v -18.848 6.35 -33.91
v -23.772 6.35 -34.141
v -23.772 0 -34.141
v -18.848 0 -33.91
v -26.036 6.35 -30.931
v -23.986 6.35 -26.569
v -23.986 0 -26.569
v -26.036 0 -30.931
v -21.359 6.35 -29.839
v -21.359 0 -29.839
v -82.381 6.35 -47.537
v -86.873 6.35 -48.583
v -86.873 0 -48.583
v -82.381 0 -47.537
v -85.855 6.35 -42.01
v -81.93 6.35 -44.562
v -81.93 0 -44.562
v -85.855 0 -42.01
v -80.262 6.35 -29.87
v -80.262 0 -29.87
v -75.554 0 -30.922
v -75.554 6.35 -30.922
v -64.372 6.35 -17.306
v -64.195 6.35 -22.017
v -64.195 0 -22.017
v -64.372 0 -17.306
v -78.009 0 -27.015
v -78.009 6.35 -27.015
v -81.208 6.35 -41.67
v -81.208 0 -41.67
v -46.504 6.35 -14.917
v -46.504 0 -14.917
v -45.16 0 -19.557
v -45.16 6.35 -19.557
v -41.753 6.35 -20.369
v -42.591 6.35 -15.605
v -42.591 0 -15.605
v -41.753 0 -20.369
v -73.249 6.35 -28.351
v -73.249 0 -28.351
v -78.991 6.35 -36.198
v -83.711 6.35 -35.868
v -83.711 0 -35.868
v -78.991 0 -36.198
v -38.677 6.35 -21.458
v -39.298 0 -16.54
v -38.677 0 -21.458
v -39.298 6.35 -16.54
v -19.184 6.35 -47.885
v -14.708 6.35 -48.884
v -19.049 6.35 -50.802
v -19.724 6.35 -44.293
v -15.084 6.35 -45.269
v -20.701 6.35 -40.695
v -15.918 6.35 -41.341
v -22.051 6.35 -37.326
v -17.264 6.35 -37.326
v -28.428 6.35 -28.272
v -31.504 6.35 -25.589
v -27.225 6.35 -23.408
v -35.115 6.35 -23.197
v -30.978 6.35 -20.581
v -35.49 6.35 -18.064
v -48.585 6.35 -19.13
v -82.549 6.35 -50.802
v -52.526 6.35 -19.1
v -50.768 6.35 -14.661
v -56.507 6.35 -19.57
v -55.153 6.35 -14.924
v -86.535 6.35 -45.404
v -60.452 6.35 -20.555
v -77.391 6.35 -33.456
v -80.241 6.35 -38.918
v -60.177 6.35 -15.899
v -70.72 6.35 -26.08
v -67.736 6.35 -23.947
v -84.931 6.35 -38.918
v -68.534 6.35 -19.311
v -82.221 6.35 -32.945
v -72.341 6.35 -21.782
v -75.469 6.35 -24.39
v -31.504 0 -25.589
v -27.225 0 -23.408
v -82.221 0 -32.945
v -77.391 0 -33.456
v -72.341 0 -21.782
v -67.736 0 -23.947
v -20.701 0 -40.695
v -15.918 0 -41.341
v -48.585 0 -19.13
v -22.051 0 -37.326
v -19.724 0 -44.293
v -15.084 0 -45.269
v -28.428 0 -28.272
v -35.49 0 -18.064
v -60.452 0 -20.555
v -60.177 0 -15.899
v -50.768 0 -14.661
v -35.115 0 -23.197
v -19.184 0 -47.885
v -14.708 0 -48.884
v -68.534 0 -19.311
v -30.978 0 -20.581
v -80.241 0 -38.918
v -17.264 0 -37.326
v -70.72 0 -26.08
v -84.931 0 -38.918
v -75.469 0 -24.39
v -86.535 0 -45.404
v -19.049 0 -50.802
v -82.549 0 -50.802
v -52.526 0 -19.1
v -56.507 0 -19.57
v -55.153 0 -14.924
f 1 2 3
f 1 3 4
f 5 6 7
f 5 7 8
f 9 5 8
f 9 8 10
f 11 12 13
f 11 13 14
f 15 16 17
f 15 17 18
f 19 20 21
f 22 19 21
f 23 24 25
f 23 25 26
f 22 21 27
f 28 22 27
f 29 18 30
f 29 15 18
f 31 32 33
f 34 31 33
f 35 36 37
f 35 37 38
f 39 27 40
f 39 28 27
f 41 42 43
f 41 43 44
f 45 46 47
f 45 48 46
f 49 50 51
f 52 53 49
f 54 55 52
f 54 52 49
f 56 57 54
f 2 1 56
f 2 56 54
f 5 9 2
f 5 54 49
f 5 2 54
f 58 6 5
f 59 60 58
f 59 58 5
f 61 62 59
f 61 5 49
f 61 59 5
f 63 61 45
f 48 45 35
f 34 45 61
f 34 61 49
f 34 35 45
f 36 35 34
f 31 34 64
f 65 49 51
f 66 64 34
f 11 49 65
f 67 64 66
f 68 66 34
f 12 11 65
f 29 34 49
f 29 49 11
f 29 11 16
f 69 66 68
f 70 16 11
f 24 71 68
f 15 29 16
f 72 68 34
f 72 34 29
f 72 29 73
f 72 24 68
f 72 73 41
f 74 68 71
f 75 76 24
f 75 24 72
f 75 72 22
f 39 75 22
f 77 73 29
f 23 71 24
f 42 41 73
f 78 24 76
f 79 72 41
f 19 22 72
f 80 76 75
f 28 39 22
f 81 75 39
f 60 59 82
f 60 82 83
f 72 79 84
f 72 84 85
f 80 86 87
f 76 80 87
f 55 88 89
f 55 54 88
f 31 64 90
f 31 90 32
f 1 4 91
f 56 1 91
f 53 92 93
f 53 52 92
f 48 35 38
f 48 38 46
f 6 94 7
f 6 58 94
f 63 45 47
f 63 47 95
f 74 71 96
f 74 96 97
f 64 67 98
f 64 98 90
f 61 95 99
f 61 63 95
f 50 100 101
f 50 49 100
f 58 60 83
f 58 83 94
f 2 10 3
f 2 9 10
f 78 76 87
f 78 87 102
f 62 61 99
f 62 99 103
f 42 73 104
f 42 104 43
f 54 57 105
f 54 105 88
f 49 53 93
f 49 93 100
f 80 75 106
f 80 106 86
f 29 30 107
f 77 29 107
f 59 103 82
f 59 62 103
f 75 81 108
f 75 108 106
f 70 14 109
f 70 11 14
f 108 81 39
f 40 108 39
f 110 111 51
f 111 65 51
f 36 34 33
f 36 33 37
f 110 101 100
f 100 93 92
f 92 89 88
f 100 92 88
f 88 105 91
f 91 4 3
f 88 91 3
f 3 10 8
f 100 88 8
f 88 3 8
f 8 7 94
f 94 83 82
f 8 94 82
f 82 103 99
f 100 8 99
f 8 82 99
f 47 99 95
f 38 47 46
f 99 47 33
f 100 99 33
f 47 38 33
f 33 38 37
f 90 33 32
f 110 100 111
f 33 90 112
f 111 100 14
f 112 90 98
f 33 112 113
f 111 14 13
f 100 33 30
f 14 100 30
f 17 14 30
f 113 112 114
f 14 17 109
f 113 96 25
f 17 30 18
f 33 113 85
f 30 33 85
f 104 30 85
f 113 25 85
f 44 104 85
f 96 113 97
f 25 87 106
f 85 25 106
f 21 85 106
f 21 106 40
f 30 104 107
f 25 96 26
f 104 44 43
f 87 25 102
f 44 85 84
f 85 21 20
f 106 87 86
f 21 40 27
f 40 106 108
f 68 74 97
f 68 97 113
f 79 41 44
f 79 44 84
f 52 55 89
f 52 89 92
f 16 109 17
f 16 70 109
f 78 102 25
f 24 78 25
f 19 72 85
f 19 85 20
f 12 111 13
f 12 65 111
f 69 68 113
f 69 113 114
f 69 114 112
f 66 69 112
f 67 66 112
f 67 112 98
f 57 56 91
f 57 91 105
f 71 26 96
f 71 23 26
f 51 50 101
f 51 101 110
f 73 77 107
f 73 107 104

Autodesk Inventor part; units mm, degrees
ref_plane "YZ Plane" through (0, 0, 0) normal (1, 0, 0) x (0, 1, 0)
ref_plane "XZ Plane" through (0, 0, 0) normal (0, 1, 0) x (-1, 0, 0)
ref_plane "XY Plane" through (0, 0, 0) normal (0, 0, 1) x (1, 0, 0)
sketch "Sketch1" plane through (0, 0, 0) normal (0, 1, 0) x (-1, 0, 0)
  line L0 (0, 0) -> (101.6, 0)
  line L1 (101.6, 0) -> (101.6, -101.6)
  line L2 (101.6, -101.6) -> (0, -101.6)
  line L3 (0, -101.6) -> (0, 0)
  dimension "d0" = 101.6
  dimension "d1" = 101.6
extrude "Extrusion1" add sketch "Sketch1" along normal blind 6.35 draft 0.25
sketch "Sketch2" plane through (0, 6.35, 0) normal (0, 1, 0) x (1, 0, 0)
  line L0 (-82.5492, 50.8025) -> (-86.8726, 48.5826)
  line L1 (-86.8726, 48.5826) -> (-82.3808, 47.537)
  line L2 (-82.3808, 47.537) -> (-86.5353, 45.4037)
  line L3 (-86.5353, 45.4037) -> (-81.9297, 44.5615)
  line L4 (-81.9297, 44.5615) -> (-85.8551, 42.0104)
  line L5 (-85.8551, 42.0104) -> (-81.2075, 41.6704)
  line L6 (-81.2075, 41.6704) -> (-84.931, 38.9182)
  line L7 (-84.931, 38.9182) -> (-80.2411, 38.9182)
  line L8 (-80.2411, 38.9182) -> (-83.7111, 35.8686)
  line L9 (-83.7111, 35.8686) -> (-78.9909, 36.1982)
  line L10 (-78.9909, 36.1982) -> (-82.2207, 32.9446)
  line L11 (-82.2207, 32.9446) -> (-77.3914, 33.4556)
  line L12 (-77.3914, 33.4556) -> (-80.2618, 29.8701)
  line L13 (-80.2618, 29.8701) -> (-75.5543, 30.9218)
  line L14 (-75.5543, 30.9218) -> (-78.0086, 27.0147)
  line L15 (-78.0086, 27.0147) -> (-73.2491, 28.3512)
  line L16 (-75.4686, 24.3897) -> (-70.7203, 26.0798)
  line L17 (-70.7203, 26.0798) -> (-72.3407, 21.7822)
  line L18 (-72.3407, 21.7822) -> (-67.7356, 23.947)
  line L19 (-67.7356, 23.947) -> (-68.5334, 19.3111)
  line L20 (-68.5334, 19.3111) -> (-64.1946, 22.0167)
  line L21 (-64.1946, 22.0167) -> (-64.3717, 17.3062)
  line L22 (-64.3717, 17.3062) -> (-60.4516, 20.5554)
  line L23 (-60.4516, 20.5554) -> (-60.1774, 15.8989)
  line L24 (-60.1774, 15.8989) -> (-56.5068, 19.5698)
  line L25 (-56.5068, 19.5698) -> (-55.1527, 14.9241)
  line L26 (-55.1527, 14.9241) -> (-52.5263, 19.0996)
  line L27 (-52.5263, 19.0996) -> (-50.7684, 14.6609)
  line L28 (-50.7684, 14.6609) -> (-48.585, 19.1298)
  line L29 (-48.585, 19.1298) -> (-46.5035, 14.9171)
  line L30 (-46.5035, 14.9171) -> (-45.1599, 19.5574)
  line L31 (-45.1599, 19.5574) -> (-42.5914, 15.6053)
  line L32 (-42.5914, 15.6053) -> (-41.7527, 20.3686)
  line L33 (-41.7527, 20.3686) -> (-39.298, 16.5397)
  line L34 (-39.298, 16.5397) -> (-38.6769, 21.4578)
  line L35 (-38.6769, 21.4578) -> (-35.49, 18.0635)
  line L36 (-35.49, 18.0635) -> (-35.1146, 23.1972)
  line L37 (-35.1146, 23.1972) -> (-30.9781, 20.581)
  line L38 (-30.9781, 20.581) -> (-31.5036, 25.5886)
  line L39 (-31.5036, 25.5886) -> (-27.2251, 23.4077)
  line L40 (-27.2251, 23.4077) -> (-28.4283, 28.2724)
  line L41 (-28.4283, 28.2724) -> (-23.9858, 26.5691)
  line L42 (-23.9858, 26.5691) -> (-26.0364, 30.9313)
  line L43 (-26.0364, 30.9313) -> (-21.3587, 29.8388)
  line L44 (-21.3587, 29.8388) -> (-23.7723, 34.1409)
  line L45 (-23.7723, 34.1409) -> (-18.848, 33.9105)
  line L46 (-18.848, 33.9105) -> (-22.0511, 37.3262)
  line L47 (-22.0511, 37.3262) -> (-17.264, 37.3262)
  line L48 (-17.264, 37.3262) -> (-20.7009, 40.6952)
  line L49 (-20.7009, 40.6952) -> (-15.918, 41.3408)
  line L50 (-15.918, 41.3408) -> (-19.7237, 44.293)
  line L51 (-19.7237, 44.293) -> (-15.0837, 45.2689)
  line L52 (-15.0837, 45.2689) -> (-19.1835, 47.8849)
  line L53 (-19.1835, 47.8849) -> (-14.7085, 48.8843)
  line L54 (-14.7085, 48.8843) -> (-19.0492, 50.8025)
  line L55 (-75.4686, 24.3897) -> (-73.2491, 28.3512)
  circle A0 centre (-50.8, 50.8) radius 31.7508
  circle A1 centre (-50.8, 50.8) radius 37.6285
  line L56 (-101.6277, 101.6277) -> (0.0277, 101.6277) projected
  line L57 (0.0277, 101.6277) -> (0.0277, -0.0277) projected
  line L58 (-101.6277, 101.6277) -> (0.0277, 101.6277)
  line L59 (0.0277, 101.6277) -> (0.0277, -0.0277)
  line L60 (0.0277, -0.0277) -> (-101.6277, -0.0277) projected
  line L61 (0.0277, -0.0277) -> (-101.6277, -0.0277)
  line L62 (-101.6277, -0.0277) -> (-101.6277, 101.6277)
extrude "Extrusion2" cut sketch "Sketch2" against normal blind 6.35 contours L56 L57 L60 L62
sketch "Sketch3" plane through (-50.8, 6.35, -50.8) normal (0, 1, 0) x (1, 0, 0)
  line L0 (-31.7492, 0.0025) -> (-36.0726, -2.2174)
  line L1 (-36.0726, -2.2174) -> (-31.5808, -3.263)
  line L2 (-31.5808, -3.263) -> (-35.7353, -5.3963)
  line L3 (-35.7353, -5.3963) -> (-31.1298, -6.2385)
  line L4 (-31.1298, -6.2385) -> (-35.0551, -8.7896)
  line L5 (-35.0551, -8.7896) -> (-30.4075, -9.1296)
  line L6 (-30.4075, -9.1296) -> (-34.131, -11.8818)
  line L7 (-34.131, -11.8818) -> (-29.4411, -11.8818)
  line L8 (-29.4411, -11.8818) -> (-32.9111, -14.9315)
  line L9 (-32.9111, -14.9315) -> (-28.191, -14.6019)
  line L10 (-28.191, -14.6019) -> (-31.4207, -17.8554)
  line L11 (-31.4207, -17.8554) -> (-26.5914, -17.3444)
  line L12 (-26.5914, -17.3444) -> (-29.4619, -20.9299)
  line L13 (-29.4619, -20.9299) -> (-24.7544, -19.8782)
  line L14 (-24.7544, -19.8782) -> (-27.2087, -23.7853)
  line L15 (-27.2087, -23.7853) -> (-22.4492, -22.4488)
  line L16 (-24.6686, -26.4103) -> (-19.9203, -24.7202)
  line L17 (-19.9203, -24.7202) -> (-21.5408, -29.0178)
  line L18 (-21.5408, -29.0178) -> (-16.9357, -26.853)
  line L19 (-16.9357, -26.853) -> (-17.7335, -31.489)
  line L20 (-17.7335, -31.489) -> (-13.3947, -28.7833)
  line L21 (-13.3947, -28.7833) -> (-13.5717, -33.4938)
  line L22 (-13.5717, -33.4938) -> (-9.6516, -30.2447)
  line L23 (-9.6516, -30.2447) -> (-9.3774, -34.9011)
  line L24 (-9.3774, -34.9011) -> (-5.7069, -31.2302)
  line L25 (-5.7069, -31.2302) -> (-4.3528, -35.8759)
  line L26 (-4.3528, -35.8759) -> (-1.7263, -31.7005)
  line L27 (-1.7263, -31.7005) -> (0.0315, -36.1391)
  line L28 (0.0315, -36.1391) -> (2.215, -31.6702)
  line L29 (2.215, -31.6702) -> (4.2964, -35.8829)
  line L30 (4.2964, -35.8829) -> (5.64, -31.2426)
  line L31 (5.64, -31.2426) -> (8.2086, -35.1948)
  line L32 (8.2086, -35.1948) -> (9.0473, -30.4314)
  line L33 (9.0473, -30.4314) -> (11.502, -34.2603)
  line L34 (11.502, -34.2603) -> (12.123, -29.3422)
  line L35 (12.123, -29.3422) -> (15.3099, -32.7365)
  line L36 (15.3099, -32.7365) -> (15.6854, -27.6028)
  line L37 (15.6854, -27.6028) -> (19.8219, -30.219)
  line L38 (19.8219, -30.219) -> (19.2964, -25.2114)
  line L39 (19.2964, -25.2114) -> (23.5749, -27.3924)
  line L40 (23.5749, -27.3924) -> (22.3717, -22.5276)
  line L41 (22.3717, -22.5276) -> (26.8141, -24.2309)
  line L42 (26.8141, -24.2309) -> (24.7636, -19.8687)
  line L43 (24.7636, -19.8687) -> (29.4412, -20.9612)
  line L44 (29.4412, -20.9612) -> (27.0277, -16.6591)
  line L45 (27.0277, -16.6591) -> (31.9519, -16.8895)
  line L46 (31.9519, -16.8895) -> (28.7489, -13.4738)
  line L47 (28.7489, -13.4738) -> (33.5359, -13.4738)
  line L48 (33.5359, -13.4738) -> (30.099, -10.1049)
  line L49 (30.099, -10.1049) -> (34.8819, -9.4592)
  line L50 (34.8819, -9.4592) -> (31.0763, -6.5071)
  line L51 (31.0763, -6.5071) -> (35.7163, -5.5311)
  line L52 (35.7163, -5.5311) -> (31.6164, -2.9151)
  line L53 (31.6164, -2.9151) -> (36.0915, -1.9157)
  line L54 (36.0915, -1.9157) -> (31.7508, 0.0025)
  line L55 (-24.6686, -26.4103) -> (-22.4492, -22.4488)
  line L56 (-31.7492, 0.0025) -> (31.7508, 0.0025)
  circle A0 centre (0.0008, 0.0025) radius 37.6862
  point P0 (50.8, -50.8)
extrude "Extrusion3" cut sketch "Sketch3" against normal blind 6.35
